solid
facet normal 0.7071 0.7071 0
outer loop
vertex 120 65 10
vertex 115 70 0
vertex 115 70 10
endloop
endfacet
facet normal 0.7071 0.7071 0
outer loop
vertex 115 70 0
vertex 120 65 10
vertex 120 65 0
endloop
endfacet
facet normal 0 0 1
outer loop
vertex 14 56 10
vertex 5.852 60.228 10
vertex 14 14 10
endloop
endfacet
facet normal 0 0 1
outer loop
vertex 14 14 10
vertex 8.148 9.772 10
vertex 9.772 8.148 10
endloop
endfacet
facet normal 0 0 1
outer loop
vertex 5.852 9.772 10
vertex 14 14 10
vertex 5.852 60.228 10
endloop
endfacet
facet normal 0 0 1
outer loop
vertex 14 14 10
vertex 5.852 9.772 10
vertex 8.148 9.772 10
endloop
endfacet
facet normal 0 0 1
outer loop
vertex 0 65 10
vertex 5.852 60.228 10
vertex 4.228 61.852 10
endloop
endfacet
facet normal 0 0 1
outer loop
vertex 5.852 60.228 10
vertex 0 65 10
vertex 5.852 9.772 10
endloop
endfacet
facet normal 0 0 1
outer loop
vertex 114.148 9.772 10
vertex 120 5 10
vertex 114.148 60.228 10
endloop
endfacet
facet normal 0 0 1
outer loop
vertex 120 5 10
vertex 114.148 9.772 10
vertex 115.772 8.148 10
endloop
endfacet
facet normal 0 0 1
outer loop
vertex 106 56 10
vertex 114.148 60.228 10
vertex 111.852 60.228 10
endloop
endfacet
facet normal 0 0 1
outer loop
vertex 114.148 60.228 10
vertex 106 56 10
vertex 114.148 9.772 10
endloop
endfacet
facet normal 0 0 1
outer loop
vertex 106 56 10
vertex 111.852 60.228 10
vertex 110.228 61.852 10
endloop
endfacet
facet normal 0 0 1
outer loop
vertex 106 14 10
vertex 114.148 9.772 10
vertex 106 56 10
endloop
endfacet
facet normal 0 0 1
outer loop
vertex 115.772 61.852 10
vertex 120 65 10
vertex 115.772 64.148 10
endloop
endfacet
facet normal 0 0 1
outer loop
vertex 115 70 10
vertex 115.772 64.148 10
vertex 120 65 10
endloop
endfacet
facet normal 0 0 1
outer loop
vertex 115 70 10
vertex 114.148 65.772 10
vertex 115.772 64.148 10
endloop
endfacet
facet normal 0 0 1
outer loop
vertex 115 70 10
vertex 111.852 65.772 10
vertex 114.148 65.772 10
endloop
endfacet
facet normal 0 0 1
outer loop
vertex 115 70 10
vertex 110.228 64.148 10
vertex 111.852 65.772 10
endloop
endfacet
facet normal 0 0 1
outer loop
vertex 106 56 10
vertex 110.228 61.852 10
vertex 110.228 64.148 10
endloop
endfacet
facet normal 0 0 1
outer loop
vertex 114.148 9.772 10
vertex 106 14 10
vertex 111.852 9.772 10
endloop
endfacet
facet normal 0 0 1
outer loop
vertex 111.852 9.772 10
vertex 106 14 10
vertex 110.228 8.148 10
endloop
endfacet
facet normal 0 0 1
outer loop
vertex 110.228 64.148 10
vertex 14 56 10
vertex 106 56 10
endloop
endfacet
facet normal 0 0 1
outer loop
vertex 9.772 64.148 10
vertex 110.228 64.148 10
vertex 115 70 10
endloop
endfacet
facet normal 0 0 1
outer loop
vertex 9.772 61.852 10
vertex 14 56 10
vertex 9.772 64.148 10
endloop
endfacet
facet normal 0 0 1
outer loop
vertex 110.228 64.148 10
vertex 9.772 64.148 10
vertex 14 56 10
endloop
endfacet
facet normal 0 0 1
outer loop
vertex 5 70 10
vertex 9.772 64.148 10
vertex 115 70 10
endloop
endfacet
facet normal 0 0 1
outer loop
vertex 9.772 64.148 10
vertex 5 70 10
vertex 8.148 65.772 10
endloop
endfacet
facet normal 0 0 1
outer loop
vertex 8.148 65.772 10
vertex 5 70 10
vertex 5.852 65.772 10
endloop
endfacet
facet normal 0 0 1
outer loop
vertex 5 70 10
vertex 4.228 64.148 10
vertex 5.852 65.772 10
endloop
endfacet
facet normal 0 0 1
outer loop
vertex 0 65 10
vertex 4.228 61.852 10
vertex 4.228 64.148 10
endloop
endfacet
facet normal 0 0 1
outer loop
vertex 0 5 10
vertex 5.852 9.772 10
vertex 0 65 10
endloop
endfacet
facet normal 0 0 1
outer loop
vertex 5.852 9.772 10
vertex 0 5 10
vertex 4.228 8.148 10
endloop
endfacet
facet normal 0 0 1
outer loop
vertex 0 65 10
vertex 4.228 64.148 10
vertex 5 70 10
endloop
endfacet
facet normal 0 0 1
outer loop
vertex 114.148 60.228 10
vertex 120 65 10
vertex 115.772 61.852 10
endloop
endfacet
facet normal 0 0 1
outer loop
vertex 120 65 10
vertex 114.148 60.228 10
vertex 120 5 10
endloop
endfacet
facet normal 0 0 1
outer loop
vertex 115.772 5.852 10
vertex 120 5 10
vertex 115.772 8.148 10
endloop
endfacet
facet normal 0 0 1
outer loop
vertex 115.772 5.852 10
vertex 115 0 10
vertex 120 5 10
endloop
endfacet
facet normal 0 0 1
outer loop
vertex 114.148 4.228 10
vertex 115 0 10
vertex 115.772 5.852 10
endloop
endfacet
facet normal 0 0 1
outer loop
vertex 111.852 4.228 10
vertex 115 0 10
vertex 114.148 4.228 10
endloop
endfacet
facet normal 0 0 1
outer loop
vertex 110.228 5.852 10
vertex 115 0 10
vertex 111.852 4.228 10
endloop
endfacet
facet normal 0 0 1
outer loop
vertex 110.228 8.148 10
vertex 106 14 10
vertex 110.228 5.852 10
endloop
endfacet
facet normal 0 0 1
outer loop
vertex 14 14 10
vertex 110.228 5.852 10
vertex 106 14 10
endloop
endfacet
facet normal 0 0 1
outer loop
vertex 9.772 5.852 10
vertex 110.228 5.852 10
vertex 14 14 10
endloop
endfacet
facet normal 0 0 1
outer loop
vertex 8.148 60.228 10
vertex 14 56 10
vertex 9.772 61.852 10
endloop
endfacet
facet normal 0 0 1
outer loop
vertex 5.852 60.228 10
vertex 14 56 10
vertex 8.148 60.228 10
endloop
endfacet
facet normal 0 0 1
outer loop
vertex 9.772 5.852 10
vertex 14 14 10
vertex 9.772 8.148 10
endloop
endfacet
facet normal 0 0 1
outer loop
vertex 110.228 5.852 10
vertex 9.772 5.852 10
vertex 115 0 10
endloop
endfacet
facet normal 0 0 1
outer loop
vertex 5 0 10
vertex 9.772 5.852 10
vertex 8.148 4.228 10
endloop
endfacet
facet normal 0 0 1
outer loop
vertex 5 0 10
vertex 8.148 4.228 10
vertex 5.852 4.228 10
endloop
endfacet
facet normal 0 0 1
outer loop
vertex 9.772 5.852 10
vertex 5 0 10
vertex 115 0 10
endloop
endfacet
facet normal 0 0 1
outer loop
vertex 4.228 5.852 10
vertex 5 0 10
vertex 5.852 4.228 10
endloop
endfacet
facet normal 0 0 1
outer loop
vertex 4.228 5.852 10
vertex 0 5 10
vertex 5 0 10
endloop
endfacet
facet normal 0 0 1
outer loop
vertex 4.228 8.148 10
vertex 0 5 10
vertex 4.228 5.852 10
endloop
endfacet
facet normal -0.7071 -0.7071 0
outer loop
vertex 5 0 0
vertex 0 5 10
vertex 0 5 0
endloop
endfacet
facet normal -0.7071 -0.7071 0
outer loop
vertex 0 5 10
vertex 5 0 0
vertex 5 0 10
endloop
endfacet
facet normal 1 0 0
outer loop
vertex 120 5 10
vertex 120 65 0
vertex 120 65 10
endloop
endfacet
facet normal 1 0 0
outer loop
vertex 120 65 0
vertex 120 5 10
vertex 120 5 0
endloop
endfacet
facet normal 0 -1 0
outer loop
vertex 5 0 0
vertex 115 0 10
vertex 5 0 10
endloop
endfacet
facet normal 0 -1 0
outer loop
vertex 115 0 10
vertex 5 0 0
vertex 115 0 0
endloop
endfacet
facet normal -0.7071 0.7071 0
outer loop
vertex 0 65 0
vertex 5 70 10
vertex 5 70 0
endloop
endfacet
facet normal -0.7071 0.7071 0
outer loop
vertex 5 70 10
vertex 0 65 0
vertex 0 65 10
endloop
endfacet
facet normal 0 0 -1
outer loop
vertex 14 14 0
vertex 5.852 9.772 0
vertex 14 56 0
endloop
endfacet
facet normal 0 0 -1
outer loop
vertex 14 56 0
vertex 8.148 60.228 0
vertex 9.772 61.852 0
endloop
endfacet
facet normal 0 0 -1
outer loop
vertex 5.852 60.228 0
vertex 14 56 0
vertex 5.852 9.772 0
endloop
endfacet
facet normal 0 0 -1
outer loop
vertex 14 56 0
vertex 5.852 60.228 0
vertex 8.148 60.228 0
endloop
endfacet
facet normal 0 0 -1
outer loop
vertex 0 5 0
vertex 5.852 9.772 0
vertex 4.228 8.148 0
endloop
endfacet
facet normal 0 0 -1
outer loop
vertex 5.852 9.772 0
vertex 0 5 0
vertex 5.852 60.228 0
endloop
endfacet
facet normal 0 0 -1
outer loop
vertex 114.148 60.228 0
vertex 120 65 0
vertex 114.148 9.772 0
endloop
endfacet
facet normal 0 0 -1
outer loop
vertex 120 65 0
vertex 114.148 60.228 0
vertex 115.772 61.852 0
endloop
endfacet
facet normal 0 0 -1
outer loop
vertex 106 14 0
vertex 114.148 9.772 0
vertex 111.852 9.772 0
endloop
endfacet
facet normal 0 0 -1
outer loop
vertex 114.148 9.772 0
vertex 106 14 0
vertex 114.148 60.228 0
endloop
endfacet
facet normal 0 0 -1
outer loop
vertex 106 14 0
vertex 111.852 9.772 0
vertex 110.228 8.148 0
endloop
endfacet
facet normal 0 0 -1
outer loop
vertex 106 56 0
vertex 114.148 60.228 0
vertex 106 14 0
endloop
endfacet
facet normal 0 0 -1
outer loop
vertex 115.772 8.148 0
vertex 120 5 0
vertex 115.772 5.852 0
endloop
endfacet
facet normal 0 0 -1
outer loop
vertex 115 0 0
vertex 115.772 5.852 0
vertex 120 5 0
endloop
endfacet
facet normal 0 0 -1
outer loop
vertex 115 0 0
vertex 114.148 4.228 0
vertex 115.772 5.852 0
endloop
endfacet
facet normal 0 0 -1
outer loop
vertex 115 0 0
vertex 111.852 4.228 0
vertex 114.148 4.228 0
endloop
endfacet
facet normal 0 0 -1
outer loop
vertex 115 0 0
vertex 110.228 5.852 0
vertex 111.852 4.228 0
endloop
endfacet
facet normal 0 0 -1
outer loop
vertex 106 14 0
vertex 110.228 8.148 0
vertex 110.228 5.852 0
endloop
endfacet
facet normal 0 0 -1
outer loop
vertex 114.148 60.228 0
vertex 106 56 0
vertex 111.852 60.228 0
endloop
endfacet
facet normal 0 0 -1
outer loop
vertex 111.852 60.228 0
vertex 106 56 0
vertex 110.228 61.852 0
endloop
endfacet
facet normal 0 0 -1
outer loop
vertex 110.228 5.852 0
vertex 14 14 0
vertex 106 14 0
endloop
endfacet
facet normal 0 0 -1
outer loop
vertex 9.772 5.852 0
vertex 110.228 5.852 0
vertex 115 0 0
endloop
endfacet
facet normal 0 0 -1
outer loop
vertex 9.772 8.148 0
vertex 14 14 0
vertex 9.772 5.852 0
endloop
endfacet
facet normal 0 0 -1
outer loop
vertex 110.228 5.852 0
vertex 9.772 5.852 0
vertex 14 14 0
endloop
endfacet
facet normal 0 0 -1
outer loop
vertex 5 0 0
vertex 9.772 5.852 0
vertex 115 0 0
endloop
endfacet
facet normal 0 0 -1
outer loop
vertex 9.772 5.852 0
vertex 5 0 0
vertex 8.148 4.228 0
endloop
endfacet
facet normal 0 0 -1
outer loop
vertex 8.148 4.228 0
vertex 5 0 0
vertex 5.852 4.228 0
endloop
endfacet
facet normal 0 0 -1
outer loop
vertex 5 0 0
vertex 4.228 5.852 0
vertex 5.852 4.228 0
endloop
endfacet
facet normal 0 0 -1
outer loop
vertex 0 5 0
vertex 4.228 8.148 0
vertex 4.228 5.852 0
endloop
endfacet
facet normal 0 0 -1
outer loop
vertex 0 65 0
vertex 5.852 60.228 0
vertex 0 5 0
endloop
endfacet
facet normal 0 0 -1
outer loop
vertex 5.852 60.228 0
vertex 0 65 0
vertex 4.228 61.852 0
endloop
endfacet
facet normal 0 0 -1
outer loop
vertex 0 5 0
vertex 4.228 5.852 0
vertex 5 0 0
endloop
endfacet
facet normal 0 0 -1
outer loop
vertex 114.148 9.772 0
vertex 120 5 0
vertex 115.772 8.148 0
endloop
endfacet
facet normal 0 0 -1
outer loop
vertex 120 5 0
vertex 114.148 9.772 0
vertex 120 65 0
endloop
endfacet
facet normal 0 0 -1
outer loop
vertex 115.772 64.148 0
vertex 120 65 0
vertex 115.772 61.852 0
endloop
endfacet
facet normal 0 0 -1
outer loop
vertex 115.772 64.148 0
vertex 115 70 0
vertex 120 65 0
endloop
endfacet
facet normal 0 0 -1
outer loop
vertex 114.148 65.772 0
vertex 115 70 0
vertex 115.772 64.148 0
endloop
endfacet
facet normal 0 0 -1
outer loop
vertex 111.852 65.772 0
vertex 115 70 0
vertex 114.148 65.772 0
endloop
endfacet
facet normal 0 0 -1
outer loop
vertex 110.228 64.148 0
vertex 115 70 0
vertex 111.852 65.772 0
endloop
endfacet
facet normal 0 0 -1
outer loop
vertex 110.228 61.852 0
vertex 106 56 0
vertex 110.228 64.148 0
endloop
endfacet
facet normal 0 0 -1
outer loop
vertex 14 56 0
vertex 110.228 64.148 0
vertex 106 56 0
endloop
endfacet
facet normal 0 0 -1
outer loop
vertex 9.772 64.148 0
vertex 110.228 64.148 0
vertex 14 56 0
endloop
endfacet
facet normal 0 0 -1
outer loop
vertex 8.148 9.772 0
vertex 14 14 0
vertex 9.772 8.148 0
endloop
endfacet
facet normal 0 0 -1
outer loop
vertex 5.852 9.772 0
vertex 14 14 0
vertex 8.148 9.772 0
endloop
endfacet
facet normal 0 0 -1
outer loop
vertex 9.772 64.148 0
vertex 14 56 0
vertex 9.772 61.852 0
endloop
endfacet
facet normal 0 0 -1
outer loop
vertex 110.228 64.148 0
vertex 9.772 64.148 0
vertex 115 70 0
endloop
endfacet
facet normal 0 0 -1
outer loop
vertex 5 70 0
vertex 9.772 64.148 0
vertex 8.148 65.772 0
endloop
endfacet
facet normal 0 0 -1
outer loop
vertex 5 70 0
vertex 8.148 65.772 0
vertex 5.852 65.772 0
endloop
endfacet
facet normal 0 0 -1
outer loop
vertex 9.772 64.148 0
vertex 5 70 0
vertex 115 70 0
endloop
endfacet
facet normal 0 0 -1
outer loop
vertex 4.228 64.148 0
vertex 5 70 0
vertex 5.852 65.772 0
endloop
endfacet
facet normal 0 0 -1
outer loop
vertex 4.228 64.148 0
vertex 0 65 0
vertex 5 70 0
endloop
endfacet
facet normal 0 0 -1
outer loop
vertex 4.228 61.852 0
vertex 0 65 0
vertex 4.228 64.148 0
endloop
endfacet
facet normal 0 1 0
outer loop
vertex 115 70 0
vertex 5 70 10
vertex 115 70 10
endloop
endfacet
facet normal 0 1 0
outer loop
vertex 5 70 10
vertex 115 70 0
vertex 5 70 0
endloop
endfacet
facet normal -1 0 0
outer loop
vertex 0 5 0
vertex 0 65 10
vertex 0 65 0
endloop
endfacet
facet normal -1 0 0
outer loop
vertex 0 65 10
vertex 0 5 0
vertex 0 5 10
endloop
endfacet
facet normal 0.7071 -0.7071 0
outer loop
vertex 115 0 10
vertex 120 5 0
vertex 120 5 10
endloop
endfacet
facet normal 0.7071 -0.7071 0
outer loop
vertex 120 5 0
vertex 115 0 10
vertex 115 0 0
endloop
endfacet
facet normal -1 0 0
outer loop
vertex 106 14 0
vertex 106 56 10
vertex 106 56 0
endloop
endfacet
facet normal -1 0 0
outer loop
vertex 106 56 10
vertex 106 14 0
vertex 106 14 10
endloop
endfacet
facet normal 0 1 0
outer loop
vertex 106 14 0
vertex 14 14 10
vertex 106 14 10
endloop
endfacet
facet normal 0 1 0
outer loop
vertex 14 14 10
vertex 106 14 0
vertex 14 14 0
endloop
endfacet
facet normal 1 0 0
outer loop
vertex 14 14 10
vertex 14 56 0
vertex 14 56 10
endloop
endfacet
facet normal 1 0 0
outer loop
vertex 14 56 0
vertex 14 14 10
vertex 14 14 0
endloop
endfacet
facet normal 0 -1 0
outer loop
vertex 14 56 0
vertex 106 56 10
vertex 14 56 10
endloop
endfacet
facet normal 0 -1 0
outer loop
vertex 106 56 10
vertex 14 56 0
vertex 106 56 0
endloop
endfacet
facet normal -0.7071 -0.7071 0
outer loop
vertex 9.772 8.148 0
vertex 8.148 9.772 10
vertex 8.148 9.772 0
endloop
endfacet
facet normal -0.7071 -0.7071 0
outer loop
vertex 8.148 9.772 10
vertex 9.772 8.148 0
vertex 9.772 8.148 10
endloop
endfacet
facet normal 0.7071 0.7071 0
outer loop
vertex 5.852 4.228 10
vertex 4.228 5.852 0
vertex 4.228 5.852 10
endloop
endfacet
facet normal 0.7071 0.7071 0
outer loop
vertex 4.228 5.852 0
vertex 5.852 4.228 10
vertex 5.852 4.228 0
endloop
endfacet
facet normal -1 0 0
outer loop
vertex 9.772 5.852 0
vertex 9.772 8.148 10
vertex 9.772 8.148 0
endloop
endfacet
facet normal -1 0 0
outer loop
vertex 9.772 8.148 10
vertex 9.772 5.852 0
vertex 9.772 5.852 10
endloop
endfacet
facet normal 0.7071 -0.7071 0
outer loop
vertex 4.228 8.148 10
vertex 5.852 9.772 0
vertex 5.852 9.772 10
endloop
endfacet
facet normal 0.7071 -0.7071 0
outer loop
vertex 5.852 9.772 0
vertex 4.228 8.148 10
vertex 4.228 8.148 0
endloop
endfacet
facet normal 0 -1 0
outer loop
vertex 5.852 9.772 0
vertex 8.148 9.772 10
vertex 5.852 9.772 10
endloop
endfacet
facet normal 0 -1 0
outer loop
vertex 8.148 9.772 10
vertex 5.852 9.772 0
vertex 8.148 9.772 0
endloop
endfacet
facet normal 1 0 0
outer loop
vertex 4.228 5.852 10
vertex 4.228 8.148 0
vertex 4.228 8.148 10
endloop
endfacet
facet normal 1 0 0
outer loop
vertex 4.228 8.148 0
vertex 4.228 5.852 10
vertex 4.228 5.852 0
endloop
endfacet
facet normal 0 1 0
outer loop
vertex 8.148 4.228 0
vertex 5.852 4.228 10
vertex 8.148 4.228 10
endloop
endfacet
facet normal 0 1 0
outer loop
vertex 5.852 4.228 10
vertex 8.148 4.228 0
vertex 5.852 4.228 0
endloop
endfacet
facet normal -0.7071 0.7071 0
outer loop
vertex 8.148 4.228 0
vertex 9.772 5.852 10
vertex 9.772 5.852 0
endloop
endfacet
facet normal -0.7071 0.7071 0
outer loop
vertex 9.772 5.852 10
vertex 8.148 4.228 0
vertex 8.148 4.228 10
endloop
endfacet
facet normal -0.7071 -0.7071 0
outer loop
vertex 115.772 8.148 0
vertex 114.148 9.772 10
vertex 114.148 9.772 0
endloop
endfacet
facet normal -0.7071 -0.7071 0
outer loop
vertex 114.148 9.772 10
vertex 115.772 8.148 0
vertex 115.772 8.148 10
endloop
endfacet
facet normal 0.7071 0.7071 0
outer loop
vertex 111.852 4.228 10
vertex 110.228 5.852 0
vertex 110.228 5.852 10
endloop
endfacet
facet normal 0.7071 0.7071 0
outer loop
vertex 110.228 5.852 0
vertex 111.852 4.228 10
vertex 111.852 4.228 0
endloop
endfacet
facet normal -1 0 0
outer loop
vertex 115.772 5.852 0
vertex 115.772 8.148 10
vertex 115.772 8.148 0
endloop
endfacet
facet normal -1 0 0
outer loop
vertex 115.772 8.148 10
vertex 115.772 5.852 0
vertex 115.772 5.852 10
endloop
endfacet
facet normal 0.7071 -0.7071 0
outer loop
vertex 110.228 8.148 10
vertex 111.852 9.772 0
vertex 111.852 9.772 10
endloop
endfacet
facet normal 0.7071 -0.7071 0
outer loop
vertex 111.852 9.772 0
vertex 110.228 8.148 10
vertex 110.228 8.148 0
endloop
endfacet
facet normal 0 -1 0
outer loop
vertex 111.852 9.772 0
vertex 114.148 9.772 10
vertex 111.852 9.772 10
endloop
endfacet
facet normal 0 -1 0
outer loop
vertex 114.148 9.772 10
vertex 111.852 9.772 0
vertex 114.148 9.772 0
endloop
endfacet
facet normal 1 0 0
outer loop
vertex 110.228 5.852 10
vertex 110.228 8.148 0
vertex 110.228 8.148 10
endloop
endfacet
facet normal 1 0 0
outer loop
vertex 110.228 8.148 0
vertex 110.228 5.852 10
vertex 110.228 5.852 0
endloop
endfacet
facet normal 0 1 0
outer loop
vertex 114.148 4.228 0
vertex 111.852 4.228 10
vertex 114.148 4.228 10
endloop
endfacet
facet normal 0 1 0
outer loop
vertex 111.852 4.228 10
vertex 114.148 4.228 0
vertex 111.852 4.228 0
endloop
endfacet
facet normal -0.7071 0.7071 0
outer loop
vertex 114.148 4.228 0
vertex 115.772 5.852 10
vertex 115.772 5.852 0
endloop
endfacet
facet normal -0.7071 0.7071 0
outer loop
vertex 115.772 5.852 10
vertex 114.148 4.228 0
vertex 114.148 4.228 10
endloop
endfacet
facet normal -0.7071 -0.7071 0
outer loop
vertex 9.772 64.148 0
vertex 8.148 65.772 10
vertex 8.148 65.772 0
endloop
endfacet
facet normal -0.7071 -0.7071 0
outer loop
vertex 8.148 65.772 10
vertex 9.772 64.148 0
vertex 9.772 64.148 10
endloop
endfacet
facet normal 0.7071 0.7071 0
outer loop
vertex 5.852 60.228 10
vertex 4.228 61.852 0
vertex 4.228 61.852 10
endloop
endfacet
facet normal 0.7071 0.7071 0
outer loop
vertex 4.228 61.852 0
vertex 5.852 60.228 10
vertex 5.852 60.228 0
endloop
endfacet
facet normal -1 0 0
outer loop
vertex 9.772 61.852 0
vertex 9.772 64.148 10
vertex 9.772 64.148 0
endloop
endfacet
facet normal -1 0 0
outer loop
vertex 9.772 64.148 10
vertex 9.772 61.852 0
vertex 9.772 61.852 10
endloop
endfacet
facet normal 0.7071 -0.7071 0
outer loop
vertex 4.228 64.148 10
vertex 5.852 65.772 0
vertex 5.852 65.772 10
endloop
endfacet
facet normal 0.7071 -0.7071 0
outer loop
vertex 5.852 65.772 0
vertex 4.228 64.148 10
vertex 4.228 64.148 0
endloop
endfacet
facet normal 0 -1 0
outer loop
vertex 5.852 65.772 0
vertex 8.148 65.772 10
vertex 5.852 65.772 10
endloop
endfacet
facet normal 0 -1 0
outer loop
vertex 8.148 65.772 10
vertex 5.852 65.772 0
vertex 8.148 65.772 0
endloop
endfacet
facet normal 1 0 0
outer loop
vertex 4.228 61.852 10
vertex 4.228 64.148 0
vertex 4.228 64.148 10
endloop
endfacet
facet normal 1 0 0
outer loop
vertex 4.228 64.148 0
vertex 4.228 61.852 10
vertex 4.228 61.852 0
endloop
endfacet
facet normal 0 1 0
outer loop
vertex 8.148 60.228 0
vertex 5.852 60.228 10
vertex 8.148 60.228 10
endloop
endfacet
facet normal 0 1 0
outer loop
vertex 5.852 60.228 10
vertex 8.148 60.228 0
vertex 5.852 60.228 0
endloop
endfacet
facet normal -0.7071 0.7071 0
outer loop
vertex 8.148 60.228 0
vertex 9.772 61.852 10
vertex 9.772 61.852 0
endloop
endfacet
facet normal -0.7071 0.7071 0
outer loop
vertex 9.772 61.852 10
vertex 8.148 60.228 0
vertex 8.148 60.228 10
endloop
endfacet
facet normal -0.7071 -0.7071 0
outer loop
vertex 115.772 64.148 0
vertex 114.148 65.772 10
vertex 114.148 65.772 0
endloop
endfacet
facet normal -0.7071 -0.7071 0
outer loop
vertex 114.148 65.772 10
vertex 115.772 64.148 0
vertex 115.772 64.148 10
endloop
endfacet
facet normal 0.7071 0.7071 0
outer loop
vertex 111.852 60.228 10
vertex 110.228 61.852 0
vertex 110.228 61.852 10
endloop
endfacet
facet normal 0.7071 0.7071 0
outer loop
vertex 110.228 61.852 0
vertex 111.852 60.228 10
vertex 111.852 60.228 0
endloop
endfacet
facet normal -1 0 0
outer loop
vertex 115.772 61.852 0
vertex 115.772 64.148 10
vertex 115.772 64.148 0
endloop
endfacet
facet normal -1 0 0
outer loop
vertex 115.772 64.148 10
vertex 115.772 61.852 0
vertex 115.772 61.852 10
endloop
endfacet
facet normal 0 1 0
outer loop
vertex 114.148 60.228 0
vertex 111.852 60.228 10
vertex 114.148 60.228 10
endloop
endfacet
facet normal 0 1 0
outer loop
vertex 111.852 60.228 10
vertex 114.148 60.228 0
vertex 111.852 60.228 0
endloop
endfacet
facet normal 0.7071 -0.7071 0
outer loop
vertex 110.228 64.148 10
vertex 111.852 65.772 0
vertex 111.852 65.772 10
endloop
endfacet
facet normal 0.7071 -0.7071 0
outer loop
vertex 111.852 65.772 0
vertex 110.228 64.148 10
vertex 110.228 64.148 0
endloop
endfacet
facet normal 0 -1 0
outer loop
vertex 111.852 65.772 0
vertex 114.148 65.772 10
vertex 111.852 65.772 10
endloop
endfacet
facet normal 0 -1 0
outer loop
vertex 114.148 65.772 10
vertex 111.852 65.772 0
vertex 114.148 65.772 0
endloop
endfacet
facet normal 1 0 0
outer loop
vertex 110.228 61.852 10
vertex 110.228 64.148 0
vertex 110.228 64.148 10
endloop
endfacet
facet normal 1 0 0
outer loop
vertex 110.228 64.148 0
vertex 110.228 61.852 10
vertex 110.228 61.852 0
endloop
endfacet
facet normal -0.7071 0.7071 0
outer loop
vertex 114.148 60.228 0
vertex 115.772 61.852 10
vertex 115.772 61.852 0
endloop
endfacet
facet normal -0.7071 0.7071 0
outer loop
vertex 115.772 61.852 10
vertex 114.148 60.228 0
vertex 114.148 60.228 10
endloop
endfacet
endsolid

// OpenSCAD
$fn = 32;

// ----------------------------------------------------------------------
// Frame plate: 120 x 70 frame, 14 mm rails
// ----------------------------------------------------------------------

// --- parameters (mm) ---
plate_l = 120;            // plate length, X
plate_w = 70;             // plate width, Y
plate_t = 10;             // plate thickness, Z (extrusion height)
corner_c = 5;             // corner chamfer
frame_bar = 14;           // frame rail width
bolt_r = 3;               // corner bolt window radius
bolt_inset = 7;           // bolt centre inset from the edges

win_l = plate_l - 2 * frame_bar;  // window length
win_w = plate_w - 2 * frame_bar;  // window width
bolt_d = 2 * bolt_r;  // corner hole diameter

profile = [[5, 0], [115, 0], [120, 5], [120, 65], [115, 70], [5, 70], [0, 65], [0, 5]];  // primary outline, 8 points, counter clockwise
void_1 = [[14, 14], [106, 14], [106, 56], [14, 56]];  // the window, 4 points
void_2 = [[9.772, 8.148], [8.148, 9.772], [5.852, 9.772], [4.228, 8.148], [4.228, 5.852], [5.852, 4.228], [8.148, 4.228], [9.772, 5.852]];  // corner bolt window, 8 points
void_3 = [[115.772, 8.148], [114.148, 9.772], [111.852, 9.772], [110.228, 8.148], [110.228, 5.852], [111.852, 4.228], [114.148, 4.228], [115.772, 5.852]];  // corner bolt window, 8 points
void_4 = [[9.772, 64.148], [8.148, 65.772], [5.852, 65.772], [4.228, 64.148], [4.228, 61.852], [5.852, 60.228], [8.148, 60.228], [9.772, 61.852]];  // corner bolt window, 8 points
void_5 = [[115.772, 64.148], [114.148, 65.772], [111.852, 65.772], [110.228, 64.148], [110.228, 61.852], [111.852, 60.228], [114.148, 60.228], [115.772, 61.852]];  // corner bolt window, 8 points

// --- the one profile operation ---
difference() {
  linear_extrude(height = plate_t) polygon(points = profile);
  translate([0, 0, -1])
    linear_extrude(height = plate_t + 2) polygon(points = void_1);
  translate([0, 0, -1])
    linear_extrude(height = plate_t + 2) polygon(points = void_2);
  translate([0, 0, -1])
    linear_extrude(height = plate_t + 2) polygon(points = void_3);
  translate([0, 0, -1])
    linear_extrude(height = plate_t + 2) polygon(points = void_4);
  translate([0, 0, -1])
    linear_extrude(height = plate_t + 2) polygon(points = void_5);
}
